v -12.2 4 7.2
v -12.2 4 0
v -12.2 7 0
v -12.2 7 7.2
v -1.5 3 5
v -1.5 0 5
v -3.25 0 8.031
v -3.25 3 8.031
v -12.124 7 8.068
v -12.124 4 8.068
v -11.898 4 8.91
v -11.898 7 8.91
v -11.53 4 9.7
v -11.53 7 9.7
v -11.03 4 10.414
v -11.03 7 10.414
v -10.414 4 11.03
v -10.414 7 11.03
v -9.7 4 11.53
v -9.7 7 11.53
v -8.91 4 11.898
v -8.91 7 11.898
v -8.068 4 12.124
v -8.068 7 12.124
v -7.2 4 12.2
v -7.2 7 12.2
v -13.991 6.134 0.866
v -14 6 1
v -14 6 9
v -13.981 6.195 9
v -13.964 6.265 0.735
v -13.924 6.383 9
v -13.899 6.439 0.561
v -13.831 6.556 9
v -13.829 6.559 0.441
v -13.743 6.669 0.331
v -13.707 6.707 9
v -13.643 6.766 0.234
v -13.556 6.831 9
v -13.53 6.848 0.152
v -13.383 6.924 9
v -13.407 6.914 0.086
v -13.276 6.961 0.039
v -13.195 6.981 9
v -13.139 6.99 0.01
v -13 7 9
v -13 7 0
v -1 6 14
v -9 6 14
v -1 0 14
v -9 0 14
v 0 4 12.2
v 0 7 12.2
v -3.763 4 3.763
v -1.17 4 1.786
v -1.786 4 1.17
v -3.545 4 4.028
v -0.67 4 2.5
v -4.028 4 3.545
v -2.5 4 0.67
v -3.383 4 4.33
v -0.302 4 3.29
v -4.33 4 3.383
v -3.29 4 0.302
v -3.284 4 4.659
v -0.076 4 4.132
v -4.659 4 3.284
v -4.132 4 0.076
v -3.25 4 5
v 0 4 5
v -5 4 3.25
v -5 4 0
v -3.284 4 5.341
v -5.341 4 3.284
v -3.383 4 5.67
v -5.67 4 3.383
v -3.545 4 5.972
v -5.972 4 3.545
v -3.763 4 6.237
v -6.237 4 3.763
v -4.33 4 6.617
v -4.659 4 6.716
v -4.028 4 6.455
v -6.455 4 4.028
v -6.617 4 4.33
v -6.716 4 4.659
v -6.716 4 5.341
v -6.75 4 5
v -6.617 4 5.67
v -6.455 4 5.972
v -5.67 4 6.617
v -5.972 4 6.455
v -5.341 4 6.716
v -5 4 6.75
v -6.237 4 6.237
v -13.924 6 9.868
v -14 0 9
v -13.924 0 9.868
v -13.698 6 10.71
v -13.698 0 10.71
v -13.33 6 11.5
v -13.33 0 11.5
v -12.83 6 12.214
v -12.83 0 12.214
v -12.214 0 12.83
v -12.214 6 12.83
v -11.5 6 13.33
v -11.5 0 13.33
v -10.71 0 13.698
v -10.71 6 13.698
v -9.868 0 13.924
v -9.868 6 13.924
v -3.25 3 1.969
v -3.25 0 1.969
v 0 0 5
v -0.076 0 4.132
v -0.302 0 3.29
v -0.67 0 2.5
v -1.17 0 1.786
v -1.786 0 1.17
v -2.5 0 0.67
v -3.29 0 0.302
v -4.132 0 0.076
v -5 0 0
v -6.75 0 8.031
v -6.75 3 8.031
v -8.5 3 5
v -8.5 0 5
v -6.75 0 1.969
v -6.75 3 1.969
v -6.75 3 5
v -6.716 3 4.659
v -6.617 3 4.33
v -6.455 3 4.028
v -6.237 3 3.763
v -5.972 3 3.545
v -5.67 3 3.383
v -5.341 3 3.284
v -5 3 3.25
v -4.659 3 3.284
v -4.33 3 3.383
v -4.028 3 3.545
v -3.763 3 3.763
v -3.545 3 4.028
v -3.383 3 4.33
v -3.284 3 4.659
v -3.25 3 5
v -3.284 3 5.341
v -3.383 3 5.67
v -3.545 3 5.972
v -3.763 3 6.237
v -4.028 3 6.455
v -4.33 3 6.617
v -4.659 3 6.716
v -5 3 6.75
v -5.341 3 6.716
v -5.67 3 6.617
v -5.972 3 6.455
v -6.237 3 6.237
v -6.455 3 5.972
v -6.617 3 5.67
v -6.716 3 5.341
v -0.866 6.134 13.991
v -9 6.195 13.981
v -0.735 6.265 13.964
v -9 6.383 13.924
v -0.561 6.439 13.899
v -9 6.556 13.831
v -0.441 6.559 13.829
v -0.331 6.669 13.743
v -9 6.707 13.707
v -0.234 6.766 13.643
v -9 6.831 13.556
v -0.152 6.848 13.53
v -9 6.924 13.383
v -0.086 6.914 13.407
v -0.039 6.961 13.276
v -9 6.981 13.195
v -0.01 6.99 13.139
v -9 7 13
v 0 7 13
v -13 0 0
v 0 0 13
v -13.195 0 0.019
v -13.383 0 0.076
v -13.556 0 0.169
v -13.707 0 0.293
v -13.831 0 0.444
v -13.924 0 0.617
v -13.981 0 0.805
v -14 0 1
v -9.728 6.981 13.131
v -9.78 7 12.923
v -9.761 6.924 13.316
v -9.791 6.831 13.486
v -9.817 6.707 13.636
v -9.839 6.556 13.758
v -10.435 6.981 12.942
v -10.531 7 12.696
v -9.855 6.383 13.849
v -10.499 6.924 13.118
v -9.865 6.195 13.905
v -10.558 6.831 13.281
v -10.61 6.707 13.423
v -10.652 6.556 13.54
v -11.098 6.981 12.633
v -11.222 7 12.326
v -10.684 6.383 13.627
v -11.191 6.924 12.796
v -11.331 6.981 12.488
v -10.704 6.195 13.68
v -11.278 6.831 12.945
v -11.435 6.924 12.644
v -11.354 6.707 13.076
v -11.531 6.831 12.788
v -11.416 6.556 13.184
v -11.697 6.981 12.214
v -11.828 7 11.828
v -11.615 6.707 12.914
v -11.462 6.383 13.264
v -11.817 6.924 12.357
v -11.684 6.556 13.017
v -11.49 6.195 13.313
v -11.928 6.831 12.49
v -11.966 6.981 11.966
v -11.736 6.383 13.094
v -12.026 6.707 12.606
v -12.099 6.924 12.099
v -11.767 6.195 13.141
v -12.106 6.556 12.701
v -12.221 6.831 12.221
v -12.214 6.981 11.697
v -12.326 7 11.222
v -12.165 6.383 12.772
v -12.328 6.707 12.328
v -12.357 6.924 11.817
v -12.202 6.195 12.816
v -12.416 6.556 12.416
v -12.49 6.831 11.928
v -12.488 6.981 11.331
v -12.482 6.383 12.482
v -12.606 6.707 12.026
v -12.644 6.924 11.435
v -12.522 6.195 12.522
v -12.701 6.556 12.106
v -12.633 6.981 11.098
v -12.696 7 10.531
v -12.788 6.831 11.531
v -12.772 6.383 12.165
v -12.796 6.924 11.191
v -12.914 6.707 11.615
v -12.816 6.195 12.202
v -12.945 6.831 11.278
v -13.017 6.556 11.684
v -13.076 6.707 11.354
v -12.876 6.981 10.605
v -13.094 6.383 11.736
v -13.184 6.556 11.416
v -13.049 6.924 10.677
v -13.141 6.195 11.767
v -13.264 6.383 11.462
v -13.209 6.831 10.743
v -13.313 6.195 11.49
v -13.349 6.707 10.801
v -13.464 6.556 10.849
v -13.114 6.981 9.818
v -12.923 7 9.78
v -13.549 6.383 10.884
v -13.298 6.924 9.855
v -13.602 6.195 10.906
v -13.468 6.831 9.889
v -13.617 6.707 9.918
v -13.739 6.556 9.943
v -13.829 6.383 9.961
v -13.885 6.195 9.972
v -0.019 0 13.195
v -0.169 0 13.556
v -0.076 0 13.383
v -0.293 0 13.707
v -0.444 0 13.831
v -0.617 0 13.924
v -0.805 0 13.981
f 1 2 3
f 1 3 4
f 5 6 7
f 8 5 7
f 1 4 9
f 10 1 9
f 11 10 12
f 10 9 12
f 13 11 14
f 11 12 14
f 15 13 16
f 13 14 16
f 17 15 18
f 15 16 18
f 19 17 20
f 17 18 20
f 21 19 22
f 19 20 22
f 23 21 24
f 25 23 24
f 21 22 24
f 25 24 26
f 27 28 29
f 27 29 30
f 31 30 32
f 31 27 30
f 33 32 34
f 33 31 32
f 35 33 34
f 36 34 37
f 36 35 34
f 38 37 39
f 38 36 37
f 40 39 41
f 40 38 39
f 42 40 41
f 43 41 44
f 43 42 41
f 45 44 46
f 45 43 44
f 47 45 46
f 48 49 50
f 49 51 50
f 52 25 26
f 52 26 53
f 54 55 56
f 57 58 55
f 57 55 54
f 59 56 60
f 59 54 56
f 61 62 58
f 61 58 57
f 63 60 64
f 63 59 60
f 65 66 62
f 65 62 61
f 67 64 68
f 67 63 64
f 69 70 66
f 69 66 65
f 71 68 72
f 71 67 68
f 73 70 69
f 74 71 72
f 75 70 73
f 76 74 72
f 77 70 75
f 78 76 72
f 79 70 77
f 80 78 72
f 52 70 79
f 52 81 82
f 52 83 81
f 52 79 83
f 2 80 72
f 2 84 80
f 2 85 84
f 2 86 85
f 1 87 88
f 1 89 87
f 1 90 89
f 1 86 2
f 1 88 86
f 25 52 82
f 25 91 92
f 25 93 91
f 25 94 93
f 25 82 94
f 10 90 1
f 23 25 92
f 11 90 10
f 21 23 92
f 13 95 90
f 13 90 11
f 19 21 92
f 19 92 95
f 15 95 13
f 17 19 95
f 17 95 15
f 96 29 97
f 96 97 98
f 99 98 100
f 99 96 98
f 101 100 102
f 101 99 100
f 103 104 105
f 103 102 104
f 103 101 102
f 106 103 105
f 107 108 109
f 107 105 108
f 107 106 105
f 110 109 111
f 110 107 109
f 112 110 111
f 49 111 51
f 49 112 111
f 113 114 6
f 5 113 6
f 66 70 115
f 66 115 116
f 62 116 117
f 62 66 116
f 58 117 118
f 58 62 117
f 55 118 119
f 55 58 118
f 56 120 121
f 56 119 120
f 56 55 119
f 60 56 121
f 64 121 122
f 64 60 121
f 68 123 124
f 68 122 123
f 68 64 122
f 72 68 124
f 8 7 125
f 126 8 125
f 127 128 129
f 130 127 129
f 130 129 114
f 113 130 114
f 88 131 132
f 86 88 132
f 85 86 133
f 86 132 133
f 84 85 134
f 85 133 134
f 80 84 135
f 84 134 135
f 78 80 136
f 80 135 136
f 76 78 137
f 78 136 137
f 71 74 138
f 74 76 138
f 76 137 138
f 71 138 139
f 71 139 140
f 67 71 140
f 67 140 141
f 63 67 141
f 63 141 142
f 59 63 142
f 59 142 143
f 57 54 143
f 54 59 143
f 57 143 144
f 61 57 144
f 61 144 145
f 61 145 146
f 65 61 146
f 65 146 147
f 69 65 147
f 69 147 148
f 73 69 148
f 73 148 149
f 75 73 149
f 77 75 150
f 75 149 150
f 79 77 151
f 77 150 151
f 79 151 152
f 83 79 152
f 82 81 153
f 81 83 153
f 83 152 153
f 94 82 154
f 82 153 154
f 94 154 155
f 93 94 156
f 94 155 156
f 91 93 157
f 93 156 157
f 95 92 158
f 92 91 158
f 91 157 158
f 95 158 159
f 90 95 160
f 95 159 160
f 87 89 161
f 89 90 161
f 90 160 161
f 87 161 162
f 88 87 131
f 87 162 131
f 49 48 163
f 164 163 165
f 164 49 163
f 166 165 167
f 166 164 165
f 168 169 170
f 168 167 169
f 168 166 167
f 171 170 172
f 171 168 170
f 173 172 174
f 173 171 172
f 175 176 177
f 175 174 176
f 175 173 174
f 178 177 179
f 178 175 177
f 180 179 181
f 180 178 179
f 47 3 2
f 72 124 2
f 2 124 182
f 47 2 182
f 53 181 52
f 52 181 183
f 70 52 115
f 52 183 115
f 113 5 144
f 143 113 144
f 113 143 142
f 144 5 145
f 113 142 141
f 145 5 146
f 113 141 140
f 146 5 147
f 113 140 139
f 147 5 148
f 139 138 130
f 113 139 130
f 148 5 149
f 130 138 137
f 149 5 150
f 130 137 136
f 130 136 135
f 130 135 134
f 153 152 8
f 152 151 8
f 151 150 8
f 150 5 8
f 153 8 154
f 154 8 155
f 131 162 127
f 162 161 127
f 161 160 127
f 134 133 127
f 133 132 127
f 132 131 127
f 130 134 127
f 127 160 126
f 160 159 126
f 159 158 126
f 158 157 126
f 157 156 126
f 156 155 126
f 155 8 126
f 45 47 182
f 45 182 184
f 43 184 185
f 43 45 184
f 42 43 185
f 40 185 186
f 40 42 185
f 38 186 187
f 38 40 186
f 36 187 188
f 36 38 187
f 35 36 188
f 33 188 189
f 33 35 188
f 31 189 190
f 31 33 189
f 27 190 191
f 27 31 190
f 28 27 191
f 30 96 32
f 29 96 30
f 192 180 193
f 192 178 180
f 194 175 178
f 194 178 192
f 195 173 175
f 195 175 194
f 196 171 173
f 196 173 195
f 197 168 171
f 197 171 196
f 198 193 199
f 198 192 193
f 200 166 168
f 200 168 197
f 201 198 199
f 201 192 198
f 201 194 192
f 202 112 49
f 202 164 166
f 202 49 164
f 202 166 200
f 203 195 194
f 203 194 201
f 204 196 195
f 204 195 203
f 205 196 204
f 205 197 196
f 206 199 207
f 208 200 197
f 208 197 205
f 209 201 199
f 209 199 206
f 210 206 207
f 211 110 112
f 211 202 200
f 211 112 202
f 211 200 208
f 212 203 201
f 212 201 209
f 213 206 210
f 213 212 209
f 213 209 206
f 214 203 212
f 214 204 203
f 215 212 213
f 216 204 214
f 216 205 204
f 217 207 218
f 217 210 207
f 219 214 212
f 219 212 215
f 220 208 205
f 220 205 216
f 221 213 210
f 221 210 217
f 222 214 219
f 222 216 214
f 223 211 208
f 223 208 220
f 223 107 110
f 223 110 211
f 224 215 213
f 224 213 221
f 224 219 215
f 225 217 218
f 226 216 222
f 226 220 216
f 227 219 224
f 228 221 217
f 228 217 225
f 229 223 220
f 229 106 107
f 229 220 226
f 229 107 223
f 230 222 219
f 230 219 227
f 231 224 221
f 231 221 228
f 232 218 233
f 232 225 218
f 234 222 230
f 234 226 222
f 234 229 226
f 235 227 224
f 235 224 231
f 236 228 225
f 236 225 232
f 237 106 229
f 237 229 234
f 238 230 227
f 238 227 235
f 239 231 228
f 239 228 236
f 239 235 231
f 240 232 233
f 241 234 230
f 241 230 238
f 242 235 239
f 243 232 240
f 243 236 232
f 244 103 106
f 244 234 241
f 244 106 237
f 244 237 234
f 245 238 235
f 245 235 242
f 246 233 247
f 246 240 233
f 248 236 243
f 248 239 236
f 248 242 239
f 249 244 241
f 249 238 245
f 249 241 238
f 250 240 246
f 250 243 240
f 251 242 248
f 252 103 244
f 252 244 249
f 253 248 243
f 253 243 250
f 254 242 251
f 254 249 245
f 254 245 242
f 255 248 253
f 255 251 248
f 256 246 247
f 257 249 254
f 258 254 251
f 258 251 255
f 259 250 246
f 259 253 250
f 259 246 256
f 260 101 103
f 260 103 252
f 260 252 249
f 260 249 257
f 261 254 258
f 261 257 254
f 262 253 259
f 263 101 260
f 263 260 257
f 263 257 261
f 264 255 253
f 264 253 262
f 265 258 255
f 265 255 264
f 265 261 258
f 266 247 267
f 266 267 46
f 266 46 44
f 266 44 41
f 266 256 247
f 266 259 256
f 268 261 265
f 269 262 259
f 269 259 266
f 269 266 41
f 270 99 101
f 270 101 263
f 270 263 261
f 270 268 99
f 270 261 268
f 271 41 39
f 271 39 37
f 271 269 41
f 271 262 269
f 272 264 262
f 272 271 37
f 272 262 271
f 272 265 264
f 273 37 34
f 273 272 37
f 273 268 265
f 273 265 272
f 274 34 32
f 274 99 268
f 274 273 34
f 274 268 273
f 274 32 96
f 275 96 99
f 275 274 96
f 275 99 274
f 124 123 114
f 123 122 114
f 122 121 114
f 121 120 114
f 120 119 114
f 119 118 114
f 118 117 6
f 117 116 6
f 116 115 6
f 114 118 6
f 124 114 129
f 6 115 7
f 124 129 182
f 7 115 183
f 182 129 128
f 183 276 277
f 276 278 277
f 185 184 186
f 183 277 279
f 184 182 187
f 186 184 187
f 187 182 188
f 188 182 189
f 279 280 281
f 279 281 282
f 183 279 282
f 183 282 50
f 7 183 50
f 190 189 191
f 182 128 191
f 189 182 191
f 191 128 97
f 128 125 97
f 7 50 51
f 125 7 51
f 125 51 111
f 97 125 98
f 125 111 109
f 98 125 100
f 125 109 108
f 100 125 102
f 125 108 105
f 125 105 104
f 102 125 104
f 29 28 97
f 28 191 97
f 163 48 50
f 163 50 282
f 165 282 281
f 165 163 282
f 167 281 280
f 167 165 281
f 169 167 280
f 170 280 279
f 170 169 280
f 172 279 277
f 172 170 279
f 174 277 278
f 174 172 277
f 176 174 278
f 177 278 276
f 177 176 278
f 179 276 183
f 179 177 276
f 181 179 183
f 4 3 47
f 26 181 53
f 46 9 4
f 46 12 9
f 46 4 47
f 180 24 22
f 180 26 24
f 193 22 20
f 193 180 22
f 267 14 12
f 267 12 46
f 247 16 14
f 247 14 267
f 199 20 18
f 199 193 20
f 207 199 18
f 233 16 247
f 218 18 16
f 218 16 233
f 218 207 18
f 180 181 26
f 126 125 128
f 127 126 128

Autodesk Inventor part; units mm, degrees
ref_plane "YZ Plane" through (0, 0, 0) normal (1, 0, 0) x (0, 1, 0)
ref_plane "XZ Plane" through (0, 0, 0) normal (0, 1, 0) x (-1, 0, 0)
ref_plane "XY Plane" through (0, 0, 0) normal (0, 0, 1) x (1, 0, 0)
sketch "Sketch1" plane through (0, 0, 0) normal (0, 1, 0) x (-1, 0, 0)
  line L0 (0, 0) -> (14, 0)
  line L1 (14, 0) -> (14, 14)
  line L2 (14, 14) -> (0, 14)
  line L3 (0, 14) -> (0, 0)
  circle A0 centre (5, 5) radius 1.75
  line L4 (0, 0) -> (12.2, 0)
  line L5 (12.2, 0) -> (12.2, 12.2)
  line L6 (12.2, 12.2) -> (0, 12.2)
  line L7 (0, 12.2) -> (0, 0)
  circle A1 centre (5, 5) radius 3.5
  line L8 (1.5, 5) -> (3.25, 8.0311)
  line L9 (3.25, 8.0311) -> (6.75, 8.0311)
  line L10 (6.75, 8.0311) -> (8.5, 5)
  line L11 (8.5, 5) -> (6.75, 1.9689)
  line L12 (6.75, 1.9689) -> (3.25, 1.9689)
  line L13 (3.25, 1.9689) -> (1.5, 5)
  dimension "d19" = 7
  dimension "d0" = 14
  dimension "d1" = 14
  dimension "d2" = 3.5
  dimension "d3" = 5
  dimension "d4" = 5
  dimension "d5" = 12.2
  dimension "d6" = 12.2
extrude "Extrusion3" add sketch "Sketch1" along normal blind 4 contours L3 L6 L5 L0 | L10 A1 | L11 L12 L13 L8 L9 L10 | A1 L11 | L9 A1 | A1 L12 | L8 A1 | A1 L13
extrude "Extrusion4" add sketch "Sketch1" along normal blind 7 contours L5 L6 L3 L2 L1 L0
fillet "Fillet3" radius 5 3 edges at (0, 2, 0) (-12.2, 5.5, 12.2) (-14, 3.5, 14)
fillet "Fillet4" radius 1 5 edges at (-12.5355, 7, 12.5355) (-4.5, 7, 14) (-14, 7, 4.5) (-14, 3.5, 0) (0, 3.5, 14)
extrude "Extrusion5" cut sketch "Sketch1" along normal blind 3 contours L11 L12 L13 L8 L9 L10
properties part number "RxBoardMountFootWithNut"
